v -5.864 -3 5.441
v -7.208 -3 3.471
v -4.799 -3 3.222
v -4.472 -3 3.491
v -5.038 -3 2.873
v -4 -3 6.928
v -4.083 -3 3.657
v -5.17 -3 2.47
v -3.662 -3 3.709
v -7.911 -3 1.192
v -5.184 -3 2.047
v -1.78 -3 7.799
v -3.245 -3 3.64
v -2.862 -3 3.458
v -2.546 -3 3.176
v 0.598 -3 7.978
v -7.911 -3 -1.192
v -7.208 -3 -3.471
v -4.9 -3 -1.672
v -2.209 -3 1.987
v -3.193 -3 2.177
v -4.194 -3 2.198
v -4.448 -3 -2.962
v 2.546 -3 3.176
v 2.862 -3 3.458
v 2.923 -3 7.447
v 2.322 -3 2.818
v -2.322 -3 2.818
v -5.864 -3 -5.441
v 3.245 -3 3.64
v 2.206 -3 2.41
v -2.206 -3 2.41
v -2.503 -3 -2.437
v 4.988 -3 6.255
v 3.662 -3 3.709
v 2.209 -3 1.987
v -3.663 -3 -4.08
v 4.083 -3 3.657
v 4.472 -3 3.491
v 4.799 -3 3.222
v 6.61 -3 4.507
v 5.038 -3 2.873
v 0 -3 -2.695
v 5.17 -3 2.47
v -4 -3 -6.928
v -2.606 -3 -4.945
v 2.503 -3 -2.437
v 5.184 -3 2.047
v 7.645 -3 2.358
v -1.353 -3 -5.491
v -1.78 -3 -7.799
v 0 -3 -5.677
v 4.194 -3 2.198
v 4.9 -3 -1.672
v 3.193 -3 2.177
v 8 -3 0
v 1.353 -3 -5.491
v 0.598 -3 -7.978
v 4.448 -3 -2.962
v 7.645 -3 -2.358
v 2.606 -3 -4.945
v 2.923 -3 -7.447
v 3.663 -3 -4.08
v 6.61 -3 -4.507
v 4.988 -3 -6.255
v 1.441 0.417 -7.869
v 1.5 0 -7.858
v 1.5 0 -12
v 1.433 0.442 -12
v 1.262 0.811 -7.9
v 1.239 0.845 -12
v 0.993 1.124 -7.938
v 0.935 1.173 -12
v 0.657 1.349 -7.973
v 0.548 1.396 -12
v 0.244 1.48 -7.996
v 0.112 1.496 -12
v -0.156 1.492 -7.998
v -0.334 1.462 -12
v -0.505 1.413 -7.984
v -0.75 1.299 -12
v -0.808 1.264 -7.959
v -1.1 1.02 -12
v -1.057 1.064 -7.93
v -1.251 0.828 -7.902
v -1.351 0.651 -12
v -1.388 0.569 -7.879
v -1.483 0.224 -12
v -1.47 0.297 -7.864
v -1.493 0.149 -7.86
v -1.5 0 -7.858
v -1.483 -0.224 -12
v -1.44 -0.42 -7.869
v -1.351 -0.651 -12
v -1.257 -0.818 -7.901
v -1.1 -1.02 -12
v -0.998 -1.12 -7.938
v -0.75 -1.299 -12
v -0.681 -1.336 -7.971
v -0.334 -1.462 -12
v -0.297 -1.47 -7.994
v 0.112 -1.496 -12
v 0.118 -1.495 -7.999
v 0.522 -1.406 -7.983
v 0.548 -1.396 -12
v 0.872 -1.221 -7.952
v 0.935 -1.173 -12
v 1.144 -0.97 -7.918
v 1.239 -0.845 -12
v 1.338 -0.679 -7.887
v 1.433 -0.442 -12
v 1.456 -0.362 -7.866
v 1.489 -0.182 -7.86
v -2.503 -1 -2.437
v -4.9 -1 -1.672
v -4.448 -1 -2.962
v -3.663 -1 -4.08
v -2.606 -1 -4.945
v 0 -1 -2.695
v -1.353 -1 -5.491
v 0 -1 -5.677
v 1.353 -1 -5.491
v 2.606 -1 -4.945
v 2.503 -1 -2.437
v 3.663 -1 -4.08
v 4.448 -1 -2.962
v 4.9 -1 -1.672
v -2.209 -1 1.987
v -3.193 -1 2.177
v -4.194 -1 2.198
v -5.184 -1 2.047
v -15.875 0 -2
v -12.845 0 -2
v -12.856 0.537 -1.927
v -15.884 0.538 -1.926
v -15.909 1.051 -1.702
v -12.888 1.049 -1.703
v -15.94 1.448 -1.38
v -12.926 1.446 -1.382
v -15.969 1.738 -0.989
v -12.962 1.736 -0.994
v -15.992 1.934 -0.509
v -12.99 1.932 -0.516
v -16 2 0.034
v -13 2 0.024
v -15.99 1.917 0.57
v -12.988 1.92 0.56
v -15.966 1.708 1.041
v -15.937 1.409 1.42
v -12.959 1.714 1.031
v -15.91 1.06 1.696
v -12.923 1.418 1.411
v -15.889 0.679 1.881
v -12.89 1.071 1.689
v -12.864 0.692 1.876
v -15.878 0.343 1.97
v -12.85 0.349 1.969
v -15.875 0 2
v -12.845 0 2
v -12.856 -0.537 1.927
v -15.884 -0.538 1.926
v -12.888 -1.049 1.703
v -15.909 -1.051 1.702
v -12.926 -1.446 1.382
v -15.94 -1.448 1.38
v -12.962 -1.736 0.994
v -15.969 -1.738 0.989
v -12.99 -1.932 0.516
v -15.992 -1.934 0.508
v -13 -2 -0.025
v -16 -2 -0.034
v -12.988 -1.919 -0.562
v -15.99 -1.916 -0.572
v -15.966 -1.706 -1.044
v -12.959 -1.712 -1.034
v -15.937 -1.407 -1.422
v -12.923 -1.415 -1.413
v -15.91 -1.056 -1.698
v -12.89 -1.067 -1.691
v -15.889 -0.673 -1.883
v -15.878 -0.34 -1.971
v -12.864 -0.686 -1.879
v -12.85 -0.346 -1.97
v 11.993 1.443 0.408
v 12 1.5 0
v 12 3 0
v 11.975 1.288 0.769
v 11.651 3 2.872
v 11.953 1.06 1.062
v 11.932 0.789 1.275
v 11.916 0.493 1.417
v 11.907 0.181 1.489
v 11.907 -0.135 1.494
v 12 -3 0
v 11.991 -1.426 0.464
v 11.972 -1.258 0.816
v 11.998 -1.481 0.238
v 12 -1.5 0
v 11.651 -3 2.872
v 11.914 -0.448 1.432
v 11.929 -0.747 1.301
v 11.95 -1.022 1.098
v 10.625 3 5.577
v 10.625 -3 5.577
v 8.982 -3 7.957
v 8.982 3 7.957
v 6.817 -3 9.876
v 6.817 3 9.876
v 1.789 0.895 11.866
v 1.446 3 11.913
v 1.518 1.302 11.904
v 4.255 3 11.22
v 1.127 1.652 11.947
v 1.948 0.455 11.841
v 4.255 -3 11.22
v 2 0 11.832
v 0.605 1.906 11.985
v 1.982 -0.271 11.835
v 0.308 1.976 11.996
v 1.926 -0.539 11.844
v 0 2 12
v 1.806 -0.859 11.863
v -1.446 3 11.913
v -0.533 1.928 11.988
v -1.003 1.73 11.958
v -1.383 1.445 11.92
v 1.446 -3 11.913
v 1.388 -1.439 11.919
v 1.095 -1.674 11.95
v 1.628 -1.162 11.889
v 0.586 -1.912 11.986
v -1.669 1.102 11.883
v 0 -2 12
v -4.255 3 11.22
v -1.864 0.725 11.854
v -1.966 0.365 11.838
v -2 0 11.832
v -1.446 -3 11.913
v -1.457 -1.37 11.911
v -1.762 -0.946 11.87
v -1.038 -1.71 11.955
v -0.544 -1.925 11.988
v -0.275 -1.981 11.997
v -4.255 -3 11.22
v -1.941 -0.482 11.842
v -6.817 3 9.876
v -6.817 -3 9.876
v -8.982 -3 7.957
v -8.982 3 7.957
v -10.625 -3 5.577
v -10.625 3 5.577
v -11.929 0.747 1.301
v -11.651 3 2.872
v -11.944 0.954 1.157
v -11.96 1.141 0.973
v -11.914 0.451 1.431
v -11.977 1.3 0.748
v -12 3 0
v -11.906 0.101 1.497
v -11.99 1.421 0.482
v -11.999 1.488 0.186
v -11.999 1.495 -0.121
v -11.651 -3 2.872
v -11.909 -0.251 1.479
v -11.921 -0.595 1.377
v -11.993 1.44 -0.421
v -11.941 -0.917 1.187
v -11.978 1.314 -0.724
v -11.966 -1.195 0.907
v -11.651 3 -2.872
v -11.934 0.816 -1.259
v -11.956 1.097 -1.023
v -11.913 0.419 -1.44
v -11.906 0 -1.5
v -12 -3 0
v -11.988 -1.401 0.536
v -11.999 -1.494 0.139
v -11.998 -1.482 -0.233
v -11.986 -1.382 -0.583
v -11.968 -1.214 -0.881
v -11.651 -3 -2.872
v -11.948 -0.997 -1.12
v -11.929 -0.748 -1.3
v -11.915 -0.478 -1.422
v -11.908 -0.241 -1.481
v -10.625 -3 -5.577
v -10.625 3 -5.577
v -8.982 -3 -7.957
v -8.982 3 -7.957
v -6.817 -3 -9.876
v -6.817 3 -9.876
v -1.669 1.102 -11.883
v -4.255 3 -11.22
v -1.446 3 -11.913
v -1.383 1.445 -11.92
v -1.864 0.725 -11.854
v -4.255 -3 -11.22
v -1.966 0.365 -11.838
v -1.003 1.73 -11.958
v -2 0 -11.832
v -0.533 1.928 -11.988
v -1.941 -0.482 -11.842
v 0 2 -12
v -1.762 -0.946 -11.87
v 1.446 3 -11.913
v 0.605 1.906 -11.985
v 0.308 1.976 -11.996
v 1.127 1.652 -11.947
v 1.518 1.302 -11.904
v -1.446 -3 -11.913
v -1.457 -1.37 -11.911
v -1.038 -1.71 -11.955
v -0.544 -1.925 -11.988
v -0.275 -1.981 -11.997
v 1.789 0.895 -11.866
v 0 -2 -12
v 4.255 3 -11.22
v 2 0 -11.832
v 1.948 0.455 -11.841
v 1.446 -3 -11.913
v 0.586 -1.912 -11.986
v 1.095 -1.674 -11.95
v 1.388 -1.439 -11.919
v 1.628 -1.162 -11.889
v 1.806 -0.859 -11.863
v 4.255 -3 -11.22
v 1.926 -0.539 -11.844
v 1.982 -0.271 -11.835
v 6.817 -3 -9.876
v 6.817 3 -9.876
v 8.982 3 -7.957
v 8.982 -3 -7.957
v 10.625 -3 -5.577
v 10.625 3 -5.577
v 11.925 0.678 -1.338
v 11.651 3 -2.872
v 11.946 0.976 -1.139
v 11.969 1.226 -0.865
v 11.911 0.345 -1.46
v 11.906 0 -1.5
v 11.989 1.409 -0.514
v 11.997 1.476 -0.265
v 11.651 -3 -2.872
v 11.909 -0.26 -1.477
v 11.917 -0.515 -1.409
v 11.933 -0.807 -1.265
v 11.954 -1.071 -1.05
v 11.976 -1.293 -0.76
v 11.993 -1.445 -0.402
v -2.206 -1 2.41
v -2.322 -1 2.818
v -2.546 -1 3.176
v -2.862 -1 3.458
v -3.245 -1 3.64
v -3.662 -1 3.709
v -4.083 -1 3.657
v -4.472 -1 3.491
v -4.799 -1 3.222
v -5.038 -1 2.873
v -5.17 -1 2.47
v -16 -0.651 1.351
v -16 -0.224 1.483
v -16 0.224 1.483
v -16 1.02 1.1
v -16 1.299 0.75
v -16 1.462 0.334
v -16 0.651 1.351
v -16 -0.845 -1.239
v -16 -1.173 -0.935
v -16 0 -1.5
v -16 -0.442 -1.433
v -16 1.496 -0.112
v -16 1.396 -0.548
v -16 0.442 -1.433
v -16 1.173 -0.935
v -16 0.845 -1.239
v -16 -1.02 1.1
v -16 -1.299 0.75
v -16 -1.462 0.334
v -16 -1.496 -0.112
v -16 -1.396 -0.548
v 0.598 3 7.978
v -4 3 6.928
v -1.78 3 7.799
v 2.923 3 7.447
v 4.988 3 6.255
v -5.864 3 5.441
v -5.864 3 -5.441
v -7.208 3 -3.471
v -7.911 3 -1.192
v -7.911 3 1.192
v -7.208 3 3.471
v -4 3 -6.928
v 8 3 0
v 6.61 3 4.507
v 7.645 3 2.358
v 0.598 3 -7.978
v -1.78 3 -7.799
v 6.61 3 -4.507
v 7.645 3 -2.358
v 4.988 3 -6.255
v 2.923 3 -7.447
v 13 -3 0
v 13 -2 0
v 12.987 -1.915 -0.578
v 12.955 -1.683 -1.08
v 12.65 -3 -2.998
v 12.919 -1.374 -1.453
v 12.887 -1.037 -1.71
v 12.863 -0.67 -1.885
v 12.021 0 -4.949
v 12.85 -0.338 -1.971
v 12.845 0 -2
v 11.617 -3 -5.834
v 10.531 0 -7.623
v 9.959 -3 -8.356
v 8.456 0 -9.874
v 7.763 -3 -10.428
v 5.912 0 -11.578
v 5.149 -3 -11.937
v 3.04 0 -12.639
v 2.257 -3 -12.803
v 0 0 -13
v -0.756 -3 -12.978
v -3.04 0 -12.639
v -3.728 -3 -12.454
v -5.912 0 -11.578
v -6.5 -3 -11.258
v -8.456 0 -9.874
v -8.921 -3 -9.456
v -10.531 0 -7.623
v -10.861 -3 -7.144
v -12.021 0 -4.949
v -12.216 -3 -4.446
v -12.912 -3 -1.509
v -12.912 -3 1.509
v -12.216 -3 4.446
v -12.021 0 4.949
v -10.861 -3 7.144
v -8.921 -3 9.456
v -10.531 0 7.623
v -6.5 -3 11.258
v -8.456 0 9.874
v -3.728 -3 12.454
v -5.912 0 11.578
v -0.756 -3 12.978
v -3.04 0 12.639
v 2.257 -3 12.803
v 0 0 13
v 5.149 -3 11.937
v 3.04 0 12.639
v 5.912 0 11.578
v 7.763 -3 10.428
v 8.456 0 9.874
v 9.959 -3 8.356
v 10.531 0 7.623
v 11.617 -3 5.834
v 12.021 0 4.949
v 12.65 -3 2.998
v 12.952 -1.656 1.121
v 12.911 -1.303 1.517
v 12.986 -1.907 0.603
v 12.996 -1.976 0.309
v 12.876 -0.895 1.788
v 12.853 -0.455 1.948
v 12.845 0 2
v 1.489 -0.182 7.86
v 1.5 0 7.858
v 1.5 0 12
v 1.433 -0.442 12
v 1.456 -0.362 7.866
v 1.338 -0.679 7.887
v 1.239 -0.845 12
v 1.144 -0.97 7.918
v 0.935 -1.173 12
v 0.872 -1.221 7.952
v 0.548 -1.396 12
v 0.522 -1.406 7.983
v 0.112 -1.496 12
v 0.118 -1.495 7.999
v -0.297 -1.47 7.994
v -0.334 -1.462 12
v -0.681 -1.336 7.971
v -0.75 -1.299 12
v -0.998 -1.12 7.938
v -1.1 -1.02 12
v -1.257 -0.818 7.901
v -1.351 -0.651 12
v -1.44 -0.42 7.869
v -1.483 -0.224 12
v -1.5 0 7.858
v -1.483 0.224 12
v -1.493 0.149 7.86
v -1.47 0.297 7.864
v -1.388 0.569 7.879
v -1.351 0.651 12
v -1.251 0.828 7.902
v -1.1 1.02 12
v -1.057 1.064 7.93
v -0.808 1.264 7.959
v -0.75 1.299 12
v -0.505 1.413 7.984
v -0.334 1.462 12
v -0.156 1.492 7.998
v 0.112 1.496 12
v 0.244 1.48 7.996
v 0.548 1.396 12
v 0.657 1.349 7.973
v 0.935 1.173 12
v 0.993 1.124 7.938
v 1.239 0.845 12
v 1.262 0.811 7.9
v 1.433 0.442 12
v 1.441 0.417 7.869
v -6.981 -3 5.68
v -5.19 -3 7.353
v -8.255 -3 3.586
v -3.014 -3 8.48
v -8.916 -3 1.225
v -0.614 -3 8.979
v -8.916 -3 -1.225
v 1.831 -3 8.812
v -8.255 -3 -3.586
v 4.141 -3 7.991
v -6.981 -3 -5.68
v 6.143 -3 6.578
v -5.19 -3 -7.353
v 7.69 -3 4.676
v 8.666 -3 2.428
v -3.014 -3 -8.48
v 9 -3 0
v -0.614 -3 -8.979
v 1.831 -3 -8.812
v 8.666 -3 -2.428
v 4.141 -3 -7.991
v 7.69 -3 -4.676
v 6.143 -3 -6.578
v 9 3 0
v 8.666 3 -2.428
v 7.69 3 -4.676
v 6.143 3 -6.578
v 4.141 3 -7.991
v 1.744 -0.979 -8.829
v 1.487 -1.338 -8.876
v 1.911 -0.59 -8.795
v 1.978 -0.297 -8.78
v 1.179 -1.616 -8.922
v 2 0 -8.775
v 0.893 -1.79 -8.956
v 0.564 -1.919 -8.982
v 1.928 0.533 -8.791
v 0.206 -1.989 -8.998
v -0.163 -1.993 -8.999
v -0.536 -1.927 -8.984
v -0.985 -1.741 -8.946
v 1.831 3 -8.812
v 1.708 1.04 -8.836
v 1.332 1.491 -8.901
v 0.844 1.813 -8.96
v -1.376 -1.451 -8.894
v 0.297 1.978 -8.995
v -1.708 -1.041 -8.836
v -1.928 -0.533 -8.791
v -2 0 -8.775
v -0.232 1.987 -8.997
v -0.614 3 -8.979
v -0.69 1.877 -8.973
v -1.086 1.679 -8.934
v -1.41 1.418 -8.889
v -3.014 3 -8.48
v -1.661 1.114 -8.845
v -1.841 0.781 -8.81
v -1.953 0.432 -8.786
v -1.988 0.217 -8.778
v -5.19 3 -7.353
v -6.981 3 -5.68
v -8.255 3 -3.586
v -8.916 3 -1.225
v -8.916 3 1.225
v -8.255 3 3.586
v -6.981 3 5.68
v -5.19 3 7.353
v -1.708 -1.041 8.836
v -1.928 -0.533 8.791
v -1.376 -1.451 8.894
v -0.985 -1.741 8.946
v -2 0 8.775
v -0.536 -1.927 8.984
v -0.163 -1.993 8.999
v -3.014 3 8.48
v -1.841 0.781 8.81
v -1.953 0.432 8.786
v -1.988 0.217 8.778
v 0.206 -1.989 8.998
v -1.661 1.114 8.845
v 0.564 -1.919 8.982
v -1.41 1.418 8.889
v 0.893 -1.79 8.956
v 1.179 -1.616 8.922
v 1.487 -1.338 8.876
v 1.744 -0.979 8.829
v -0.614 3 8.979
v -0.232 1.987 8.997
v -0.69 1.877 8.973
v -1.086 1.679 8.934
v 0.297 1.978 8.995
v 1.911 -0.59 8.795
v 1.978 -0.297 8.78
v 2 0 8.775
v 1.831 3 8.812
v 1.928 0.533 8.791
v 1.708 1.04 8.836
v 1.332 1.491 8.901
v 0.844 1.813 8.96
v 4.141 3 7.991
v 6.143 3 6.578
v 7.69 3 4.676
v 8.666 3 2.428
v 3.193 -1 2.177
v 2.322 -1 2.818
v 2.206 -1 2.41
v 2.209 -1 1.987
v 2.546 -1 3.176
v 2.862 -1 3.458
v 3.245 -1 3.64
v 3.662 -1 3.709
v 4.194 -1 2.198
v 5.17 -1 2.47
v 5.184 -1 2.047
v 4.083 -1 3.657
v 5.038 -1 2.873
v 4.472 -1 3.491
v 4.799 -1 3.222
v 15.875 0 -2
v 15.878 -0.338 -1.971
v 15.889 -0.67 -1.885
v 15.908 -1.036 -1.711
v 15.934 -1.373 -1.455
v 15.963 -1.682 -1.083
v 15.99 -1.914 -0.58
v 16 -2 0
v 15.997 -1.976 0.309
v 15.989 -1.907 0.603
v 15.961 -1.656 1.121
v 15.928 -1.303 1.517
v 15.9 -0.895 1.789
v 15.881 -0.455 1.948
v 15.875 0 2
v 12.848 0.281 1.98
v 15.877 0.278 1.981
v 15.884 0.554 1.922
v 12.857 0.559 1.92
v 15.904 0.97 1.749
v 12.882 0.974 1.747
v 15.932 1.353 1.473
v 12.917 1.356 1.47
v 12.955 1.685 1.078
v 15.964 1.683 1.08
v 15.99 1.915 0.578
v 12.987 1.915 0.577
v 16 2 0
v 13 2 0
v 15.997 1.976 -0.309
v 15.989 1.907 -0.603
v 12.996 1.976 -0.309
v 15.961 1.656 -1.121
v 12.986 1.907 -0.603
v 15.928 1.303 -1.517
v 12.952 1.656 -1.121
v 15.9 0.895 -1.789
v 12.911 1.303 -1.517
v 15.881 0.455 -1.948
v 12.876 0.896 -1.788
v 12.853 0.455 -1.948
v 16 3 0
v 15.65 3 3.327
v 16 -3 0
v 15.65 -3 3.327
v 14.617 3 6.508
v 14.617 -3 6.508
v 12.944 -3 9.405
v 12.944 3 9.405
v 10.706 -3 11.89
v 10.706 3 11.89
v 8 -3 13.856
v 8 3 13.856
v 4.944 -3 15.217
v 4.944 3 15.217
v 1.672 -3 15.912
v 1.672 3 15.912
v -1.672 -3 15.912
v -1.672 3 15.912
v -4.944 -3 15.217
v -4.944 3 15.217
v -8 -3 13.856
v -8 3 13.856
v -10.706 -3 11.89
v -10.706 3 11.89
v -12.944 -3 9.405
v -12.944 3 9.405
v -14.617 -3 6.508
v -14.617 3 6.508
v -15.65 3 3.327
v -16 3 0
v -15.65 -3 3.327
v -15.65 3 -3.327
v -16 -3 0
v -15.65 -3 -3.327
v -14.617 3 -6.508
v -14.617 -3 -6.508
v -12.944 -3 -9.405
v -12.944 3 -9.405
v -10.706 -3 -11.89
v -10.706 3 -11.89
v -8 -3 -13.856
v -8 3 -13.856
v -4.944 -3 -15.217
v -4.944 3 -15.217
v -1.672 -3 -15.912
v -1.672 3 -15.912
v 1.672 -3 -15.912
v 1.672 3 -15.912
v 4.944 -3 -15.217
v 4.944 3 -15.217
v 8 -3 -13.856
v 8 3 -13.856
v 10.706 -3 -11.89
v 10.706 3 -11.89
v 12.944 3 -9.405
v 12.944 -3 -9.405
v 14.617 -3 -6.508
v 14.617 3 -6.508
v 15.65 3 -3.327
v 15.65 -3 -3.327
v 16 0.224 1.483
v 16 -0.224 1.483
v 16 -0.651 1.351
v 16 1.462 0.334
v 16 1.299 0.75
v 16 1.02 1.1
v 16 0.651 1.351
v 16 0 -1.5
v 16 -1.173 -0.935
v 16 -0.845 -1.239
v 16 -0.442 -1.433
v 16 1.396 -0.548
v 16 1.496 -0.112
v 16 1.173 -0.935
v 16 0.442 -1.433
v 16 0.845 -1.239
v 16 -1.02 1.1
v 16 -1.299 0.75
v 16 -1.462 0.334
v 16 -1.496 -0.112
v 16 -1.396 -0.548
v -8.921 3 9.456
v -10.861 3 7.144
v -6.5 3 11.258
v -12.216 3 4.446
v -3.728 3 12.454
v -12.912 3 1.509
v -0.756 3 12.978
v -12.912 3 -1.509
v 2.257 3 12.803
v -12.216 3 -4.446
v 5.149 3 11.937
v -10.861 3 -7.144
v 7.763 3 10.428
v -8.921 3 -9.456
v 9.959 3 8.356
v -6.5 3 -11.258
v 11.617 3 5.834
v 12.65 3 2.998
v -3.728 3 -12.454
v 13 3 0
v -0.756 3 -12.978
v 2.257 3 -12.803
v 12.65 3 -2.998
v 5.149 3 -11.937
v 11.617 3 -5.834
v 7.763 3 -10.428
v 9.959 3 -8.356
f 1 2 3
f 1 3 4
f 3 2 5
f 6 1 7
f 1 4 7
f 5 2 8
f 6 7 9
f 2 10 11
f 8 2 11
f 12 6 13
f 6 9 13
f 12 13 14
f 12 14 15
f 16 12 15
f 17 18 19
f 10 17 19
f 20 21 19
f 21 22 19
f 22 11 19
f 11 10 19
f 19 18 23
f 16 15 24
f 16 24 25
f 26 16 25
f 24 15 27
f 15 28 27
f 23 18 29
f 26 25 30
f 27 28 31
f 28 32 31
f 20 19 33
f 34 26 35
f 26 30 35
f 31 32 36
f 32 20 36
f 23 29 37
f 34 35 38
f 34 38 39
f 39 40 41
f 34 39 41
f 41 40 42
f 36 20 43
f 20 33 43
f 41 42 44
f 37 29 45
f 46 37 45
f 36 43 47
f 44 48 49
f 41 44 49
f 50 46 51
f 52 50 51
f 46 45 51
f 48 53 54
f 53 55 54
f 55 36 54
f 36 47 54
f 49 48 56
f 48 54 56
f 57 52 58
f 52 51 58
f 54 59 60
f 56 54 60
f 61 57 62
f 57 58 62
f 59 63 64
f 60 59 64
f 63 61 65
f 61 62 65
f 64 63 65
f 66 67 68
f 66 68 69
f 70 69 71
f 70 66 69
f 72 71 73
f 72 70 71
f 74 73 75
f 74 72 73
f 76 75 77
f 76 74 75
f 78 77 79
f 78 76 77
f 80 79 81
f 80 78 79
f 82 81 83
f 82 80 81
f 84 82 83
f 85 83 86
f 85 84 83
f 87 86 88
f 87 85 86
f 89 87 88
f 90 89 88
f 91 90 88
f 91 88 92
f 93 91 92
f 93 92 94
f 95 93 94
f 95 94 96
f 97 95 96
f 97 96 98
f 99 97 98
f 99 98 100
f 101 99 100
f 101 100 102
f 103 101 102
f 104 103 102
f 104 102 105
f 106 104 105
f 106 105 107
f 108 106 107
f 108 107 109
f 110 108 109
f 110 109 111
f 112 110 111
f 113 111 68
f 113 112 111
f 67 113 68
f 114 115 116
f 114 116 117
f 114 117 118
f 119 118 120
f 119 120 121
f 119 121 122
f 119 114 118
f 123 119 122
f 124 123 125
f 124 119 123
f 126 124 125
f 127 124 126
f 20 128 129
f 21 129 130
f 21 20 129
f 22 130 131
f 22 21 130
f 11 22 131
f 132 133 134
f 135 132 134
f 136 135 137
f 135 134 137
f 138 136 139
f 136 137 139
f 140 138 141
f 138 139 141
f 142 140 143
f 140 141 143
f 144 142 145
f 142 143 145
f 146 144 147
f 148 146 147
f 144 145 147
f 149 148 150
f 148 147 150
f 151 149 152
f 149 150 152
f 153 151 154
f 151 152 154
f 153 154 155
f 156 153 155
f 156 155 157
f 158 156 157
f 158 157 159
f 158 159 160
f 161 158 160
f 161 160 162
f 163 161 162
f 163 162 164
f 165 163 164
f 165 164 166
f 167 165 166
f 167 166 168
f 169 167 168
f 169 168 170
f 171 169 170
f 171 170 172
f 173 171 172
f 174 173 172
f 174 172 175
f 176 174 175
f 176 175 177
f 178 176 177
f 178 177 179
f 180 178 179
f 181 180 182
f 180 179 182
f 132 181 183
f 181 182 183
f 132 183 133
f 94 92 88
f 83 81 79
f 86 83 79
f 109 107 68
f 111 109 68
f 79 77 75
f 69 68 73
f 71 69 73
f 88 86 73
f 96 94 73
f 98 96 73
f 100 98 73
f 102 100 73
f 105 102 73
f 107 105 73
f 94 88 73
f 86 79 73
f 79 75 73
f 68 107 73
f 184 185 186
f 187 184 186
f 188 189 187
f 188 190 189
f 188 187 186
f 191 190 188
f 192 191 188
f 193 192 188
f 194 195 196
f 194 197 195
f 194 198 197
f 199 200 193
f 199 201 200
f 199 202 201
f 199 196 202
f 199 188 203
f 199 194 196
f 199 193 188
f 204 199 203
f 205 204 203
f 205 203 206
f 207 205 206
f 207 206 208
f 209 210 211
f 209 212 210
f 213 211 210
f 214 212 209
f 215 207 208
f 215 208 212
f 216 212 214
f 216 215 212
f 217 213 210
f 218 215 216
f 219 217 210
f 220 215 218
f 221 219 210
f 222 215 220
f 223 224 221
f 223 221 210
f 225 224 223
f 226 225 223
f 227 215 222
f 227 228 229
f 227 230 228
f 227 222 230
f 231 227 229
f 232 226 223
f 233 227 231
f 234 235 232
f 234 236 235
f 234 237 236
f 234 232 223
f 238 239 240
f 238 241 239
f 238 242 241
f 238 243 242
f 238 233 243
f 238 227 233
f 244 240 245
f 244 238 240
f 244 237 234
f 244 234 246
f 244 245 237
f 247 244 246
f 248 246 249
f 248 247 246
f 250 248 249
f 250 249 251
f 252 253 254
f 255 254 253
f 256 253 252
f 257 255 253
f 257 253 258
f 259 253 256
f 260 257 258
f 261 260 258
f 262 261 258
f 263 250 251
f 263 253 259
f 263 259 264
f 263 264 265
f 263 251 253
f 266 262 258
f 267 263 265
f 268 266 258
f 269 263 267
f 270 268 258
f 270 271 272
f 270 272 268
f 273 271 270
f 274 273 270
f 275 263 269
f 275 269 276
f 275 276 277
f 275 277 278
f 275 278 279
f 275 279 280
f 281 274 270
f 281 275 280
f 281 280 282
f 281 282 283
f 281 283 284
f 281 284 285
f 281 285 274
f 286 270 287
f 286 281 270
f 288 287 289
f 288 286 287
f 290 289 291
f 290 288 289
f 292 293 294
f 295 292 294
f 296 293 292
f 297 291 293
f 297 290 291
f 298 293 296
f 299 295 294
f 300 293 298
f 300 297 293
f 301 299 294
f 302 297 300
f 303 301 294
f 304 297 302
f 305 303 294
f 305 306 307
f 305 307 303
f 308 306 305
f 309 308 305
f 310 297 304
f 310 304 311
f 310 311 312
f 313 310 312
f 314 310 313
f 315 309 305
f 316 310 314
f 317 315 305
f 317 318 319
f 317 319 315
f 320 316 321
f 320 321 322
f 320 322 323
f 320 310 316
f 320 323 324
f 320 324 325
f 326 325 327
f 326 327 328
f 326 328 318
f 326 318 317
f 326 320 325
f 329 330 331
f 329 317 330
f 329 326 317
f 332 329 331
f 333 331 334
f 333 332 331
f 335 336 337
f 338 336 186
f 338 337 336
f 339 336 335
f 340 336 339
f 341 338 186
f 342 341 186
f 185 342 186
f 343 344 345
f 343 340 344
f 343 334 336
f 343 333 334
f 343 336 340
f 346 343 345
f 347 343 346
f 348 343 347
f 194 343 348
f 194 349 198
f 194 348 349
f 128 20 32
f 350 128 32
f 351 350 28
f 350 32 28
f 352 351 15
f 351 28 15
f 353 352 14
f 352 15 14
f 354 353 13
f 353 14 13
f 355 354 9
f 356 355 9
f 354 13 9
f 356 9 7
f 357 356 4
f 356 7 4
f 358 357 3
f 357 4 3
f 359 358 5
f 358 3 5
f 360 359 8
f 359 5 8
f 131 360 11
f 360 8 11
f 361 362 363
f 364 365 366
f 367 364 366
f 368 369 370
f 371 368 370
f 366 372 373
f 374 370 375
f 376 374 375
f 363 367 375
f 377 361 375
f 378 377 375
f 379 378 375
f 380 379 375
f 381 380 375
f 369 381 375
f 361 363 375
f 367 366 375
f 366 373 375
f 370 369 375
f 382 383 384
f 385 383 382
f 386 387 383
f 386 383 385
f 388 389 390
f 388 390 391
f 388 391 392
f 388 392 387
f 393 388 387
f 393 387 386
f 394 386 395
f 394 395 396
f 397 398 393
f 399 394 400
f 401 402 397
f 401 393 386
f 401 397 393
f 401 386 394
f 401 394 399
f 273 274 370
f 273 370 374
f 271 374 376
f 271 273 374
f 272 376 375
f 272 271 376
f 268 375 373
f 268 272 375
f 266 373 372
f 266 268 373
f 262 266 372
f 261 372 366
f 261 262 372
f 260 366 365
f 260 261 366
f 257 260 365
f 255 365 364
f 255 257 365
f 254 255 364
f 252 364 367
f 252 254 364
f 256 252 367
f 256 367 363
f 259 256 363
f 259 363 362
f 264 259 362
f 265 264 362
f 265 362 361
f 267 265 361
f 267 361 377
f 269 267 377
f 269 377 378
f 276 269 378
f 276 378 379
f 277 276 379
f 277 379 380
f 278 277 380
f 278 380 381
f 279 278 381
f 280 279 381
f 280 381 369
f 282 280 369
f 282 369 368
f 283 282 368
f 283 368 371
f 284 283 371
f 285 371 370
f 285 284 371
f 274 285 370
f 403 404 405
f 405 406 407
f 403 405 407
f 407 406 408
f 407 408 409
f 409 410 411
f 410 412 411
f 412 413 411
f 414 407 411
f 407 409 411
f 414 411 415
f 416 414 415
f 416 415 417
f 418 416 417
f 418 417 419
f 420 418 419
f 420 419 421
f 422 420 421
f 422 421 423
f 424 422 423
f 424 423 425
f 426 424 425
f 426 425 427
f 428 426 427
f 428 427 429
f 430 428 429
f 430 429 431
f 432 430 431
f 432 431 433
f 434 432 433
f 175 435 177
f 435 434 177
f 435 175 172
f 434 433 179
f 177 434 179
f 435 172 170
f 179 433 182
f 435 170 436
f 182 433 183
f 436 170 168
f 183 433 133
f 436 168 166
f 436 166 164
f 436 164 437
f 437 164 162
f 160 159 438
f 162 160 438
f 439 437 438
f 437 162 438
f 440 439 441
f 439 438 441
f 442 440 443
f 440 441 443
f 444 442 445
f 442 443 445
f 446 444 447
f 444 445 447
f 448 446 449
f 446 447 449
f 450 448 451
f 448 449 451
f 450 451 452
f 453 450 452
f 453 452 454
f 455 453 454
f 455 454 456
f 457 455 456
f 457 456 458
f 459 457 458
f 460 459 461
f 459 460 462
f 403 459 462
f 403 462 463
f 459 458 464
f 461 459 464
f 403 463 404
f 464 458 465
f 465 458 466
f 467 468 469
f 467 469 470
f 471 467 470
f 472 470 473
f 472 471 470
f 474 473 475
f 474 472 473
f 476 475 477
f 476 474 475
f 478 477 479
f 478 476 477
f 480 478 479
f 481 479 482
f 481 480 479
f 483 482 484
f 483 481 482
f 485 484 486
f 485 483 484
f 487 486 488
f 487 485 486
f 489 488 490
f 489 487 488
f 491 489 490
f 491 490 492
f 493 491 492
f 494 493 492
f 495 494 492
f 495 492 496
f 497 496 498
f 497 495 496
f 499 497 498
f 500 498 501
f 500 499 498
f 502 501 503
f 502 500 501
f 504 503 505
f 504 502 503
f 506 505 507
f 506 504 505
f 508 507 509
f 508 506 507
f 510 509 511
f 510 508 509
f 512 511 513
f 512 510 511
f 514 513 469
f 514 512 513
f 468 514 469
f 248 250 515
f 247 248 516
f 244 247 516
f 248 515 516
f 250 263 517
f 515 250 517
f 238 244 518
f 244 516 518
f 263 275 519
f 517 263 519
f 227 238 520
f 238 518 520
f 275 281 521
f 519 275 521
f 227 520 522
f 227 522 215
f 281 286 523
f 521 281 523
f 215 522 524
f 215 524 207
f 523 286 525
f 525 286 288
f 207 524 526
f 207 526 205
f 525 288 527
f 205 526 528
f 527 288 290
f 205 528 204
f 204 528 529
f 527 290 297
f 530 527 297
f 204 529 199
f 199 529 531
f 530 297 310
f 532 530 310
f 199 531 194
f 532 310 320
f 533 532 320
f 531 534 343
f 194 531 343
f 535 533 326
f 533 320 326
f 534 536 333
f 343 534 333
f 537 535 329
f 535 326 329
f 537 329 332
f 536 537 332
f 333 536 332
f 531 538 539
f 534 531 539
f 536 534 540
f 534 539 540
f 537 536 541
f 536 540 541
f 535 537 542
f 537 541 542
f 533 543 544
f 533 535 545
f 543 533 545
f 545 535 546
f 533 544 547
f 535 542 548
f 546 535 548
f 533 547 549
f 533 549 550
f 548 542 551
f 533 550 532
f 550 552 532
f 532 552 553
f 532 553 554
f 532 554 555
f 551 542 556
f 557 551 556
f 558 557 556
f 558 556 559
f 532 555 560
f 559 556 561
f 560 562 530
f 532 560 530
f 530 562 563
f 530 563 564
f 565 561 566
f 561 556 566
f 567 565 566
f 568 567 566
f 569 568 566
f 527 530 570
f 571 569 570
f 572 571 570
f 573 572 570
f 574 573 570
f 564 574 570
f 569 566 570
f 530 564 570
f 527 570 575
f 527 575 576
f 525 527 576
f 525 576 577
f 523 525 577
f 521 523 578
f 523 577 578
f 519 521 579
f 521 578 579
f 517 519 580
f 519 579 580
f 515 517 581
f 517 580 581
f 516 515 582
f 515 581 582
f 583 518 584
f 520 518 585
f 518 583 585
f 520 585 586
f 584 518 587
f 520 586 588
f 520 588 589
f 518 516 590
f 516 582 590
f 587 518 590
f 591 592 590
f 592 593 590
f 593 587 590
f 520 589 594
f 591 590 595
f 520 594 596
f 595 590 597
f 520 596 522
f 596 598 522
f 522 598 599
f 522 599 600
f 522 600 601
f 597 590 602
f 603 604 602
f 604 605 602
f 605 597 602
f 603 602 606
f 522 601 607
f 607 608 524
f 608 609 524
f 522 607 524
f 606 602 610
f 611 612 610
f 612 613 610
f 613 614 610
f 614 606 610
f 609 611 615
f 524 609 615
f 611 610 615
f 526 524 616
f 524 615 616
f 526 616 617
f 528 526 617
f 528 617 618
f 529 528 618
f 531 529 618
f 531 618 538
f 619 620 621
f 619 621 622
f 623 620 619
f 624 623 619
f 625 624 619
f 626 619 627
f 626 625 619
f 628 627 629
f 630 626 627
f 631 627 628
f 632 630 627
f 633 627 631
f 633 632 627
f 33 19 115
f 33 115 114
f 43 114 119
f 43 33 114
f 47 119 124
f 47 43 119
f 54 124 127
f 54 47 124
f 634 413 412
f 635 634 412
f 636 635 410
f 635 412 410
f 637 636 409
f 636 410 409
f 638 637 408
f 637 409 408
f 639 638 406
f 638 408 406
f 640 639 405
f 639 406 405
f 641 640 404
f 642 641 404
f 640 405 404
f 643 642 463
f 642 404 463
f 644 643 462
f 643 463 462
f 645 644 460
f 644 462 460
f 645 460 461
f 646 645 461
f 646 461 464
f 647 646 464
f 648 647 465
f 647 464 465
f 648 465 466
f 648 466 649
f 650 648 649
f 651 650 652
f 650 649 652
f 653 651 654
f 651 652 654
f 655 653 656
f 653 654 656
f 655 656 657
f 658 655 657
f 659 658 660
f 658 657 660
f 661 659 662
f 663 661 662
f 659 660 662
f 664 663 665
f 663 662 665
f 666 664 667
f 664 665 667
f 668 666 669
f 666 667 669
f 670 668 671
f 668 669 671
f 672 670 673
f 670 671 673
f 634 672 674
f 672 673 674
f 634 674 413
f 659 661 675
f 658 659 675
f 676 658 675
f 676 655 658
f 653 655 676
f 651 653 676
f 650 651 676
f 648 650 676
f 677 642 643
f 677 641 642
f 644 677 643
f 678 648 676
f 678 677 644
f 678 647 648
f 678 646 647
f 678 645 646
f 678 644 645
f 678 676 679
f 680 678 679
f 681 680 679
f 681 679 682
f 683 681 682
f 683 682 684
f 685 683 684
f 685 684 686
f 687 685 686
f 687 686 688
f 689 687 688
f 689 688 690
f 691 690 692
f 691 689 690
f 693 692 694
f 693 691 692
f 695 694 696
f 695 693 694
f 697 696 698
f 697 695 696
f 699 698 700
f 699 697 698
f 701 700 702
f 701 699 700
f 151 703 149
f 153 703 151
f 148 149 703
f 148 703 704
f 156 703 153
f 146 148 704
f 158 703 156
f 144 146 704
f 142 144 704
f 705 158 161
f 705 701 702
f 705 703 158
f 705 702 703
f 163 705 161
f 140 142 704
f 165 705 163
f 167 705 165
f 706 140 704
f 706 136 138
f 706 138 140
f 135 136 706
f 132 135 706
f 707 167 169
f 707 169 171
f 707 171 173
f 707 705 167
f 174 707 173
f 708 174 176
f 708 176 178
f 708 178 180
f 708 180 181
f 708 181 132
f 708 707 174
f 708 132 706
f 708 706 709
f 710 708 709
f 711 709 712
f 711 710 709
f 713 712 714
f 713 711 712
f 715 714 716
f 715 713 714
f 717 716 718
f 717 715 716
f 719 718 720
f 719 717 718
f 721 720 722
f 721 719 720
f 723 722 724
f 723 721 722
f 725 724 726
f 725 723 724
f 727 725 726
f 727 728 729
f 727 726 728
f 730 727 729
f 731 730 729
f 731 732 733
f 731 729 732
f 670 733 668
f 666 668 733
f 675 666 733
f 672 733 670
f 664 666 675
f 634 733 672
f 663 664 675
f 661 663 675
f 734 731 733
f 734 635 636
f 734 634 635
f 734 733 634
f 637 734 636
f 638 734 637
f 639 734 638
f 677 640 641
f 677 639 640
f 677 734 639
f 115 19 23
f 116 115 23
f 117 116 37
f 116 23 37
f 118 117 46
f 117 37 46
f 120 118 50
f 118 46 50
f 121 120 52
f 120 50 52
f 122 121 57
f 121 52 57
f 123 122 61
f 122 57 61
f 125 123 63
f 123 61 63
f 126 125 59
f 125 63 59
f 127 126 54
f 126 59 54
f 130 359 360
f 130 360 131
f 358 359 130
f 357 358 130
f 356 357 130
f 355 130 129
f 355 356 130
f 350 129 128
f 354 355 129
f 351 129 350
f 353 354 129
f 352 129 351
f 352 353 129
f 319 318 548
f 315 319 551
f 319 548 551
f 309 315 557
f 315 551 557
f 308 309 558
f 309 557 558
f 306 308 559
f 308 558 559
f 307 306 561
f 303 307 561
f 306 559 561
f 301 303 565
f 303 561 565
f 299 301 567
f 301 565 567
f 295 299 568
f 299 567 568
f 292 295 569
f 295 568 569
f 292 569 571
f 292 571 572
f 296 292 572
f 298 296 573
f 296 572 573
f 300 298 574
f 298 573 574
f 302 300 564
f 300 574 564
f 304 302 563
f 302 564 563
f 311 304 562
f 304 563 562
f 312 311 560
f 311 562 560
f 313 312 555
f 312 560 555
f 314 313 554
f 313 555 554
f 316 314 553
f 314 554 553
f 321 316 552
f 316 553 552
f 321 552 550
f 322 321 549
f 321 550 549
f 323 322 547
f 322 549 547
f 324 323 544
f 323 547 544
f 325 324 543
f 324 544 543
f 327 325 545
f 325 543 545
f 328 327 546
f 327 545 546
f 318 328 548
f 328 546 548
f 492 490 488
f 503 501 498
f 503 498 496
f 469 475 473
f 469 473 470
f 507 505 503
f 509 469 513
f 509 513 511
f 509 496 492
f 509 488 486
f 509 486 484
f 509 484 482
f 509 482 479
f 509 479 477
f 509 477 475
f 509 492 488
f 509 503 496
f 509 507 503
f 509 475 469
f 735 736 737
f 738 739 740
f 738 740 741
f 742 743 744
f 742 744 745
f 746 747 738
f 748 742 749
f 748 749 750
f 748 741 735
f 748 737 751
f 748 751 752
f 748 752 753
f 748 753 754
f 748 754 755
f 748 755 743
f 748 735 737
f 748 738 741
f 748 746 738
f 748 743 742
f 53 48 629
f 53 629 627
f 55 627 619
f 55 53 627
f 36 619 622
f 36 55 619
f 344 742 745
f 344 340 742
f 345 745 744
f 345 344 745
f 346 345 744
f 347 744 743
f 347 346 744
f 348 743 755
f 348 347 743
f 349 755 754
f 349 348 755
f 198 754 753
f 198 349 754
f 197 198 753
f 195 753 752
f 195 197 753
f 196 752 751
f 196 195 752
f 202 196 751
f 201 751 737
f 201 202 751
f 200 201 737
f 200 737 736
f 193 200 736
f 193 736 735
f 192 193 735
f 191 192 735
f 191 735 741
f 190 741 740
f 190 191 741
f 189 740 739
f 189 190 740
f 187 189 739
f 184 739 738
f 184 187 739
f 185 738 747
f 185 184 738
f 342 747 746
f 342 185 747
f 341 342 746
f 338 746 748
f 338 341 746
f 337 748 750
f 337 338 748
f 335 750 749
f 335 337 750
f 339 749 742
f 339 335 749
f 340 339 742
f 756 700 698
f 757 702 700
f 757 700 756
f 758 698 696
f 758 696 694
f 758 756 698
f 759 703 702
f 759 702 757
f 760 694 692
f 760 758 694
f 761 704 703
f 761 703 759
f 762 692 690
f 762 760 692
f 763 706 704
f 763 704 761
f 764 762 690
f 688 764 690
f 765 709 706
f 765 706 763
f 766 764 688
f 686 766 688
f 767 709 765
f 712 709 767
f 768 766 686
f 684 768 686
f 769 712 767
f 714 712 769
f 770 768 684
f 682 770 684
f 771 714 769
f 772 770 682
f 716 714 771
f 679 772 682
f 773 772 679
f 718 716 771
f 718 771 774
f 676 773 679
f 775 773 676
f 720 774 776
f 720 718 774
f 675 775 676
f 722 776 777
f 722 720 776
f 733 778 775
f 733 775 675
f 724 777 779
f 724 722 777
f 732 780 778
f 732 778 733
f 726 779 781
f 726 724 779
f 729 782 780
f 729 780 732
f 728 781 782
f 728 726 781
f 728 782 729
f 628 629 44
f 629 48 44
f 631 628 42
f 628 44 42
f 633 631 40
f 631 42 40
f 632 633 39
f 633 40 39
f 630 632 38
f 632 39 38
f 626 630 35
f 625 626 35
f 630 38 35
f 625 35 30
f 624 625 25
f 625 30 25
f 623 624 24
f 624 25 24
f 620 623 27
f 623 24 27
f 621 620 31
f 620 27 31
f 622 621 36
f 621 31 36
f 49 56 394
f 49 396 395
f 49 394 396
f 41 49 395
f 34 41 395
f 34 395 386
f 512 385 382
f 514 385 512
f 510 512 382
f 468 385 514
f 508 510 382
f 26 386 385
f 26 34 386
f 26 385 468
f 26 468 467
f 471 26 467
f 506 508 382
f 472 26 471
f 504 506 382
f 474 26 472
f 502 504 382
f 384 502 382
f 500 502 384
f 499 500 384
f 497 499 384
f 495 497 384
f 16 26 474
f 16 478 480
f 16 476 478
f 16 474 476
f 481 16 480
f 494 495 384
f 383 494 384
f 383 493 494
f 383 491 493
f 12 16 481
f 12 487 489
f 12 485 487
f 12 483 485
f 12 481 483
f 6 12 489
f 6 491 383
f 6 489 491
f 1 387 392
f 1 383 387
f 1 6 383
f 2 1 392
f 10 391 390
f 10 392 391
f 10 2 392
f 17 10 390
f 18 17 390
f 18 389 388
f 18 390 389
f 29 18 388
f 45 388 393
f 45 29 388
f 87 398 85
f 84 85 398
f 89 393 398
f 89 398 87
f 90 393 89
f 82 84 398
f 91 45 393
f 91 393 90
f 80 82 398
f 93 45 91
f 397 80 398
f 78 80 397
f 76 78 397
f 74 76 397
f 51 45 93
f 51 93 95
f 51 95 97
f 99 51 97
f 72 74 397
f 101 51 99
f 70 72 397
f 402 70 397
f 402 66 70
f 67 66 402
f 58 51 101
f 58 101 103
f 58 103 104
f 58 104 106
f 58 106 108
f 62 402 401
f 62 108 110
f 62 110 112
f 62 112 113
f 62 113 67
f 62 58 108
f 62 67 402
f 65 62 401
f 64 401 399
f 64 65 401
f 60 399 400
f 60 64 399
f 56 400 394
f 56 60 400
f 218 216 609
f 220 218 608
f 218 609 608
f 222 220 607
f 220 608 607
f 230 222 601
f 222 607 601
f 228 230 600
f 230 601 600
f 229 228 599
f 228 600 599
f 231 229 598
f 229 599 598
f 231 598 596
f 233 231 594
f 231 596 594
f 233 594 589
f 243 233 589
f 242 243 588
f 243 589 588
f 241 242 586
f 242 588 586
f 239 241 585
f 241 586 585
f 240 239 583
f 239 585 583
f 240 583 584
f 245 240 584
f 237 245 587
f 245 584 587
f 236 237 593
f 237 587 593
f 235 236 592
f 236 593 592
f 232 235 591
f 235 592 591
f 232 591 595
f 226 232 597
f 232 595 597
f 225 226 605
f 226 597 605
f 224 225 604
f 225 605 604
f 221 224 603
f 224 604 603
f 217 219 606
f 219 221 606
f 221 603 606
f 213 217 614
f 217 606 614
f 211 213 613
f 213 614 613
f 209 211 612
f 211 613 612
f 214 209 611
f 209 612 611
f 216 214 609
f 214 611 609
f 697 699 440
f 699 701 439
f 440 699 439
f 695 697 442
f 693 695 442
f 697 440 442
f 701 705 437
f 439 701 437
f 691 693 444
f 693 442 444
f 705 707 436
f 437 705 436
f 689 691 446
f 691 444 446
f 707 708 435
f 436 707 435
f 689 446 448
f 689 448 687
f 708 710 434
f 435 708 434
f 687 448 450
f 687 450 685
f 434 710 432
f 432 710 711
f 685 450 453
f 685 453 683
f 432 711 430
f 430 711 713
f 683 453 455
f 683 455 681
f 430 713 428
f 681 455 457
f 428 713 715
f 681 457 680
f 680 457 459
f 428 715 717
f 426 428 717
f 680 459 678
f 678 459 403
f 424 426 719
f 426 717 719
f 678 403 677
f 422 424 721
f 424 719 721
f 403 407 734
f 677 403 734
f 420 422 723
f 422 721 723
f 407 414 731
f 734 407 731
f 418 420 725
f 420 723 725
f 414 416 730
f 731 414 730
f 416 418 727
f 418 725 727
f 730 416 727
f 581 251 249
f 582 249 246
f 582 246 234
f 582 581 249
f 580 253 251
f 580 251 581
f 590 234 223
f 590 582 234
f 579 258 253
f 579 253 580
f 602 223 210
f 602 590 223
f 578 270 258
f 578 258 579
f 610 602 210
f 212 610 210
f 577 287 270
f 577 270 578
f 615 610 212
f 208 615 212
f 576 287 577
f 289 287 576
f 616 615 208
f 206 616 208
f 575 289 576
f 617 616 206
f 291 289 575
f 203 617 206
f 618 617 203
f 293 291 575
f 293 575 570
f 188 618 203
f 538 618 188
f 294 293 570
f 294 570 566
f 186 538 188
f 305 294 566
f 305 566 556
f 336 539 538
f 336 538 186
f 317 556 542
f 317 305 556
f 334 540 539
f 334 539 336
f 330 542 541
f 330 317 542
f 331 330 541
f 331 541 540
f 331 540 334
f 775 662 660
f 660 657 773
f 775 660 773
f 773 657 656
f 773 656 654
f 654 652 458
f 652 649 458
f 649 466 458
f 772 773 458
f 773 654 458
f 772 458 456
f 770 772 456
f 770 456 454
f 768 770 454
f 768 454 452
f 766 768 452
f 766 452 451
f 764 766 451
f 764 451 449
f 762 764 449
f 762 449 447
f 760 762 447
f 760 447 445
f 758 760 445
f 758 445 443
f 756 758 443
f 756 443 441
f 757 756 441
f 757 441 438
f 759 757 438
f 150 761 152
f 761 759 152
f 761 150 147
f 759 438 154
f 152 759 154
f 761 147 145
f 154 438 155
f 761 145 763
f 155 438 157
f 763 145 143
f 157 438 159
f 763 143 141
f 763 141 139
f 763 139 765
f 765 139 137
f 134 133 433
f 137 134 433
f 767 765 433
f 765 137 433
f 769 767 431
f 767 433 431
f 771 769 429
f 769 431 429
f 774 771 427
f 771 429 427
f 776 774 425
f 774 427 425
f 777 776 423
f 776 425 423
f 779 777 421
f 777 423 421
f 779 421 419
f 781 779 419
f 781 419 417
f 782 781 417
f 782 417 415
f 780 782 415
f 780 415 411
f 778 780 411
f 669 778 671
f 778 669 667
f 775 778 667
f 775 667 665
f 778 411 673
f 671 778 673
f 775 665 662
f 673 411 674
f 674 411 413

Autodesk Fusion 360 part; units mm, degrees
sketch "Sketch1" plane through (0, 0, 0) normal (0, 1, 0) x (1, 0, 0)
  circle A0 centre (0, 0) radius 8
  circle A1 centre (0, 0) radius 9
  circle A2 centre (0, 0) radius 12
  circle A3 centre (0, 0) radius 13
  circle A4 centre (0, 0) radius 16
  dimension "d4" = 16
  dimension "d5" = 1
  dimension "d6" = 3
  dimension "d7" = 1
  dimension "d8" = 3
extrude "Extrude1" add sketch "Sketch1" along normal mid plane 6 makes body 1 at (1.6626, 3, 1.29) makes body 2 at (11.9851, 2, 0.5982) makes body 3 at (15.9801, 2, 0.7975)
sketch "Sketch2" plane through (0, 0, 0) normal (0, 0, 1) x (1, 0, 0)
  circle A0 centre (0, 0) radius 1.5
  circle A1 centre (0, 0) radius 2
  dimension "d13" = 3
  dimension "d14" = 0.5
extrude "Extrude2" add sketch "Sketch2" along normal mid plane 24 contours A0 bodies 1
extrude "Extrude3" cut sketch "Sketch2" along normal mid plane 24 contours A0 | A1 bodies 2
sketch "Sketch3" plane through (0, 0, 0) normal (1, 0, 0) x (0, 0, -1)
  circle A0 centre (0, 0) radius 1.5
  circle A1 centre (0, 0) radius 2
  dimension "d19" = 3
  dimension "d20" = 0.5
extrude "Extrude4" add sketch "Sketch3" along normal blind 7 from surface at 9 contours A0 bodies 2
extrude "Extrude5" add sketch "Sketch3" against normal blind 7 from surface at -9 contours A0 bodies 2
extrude "Extrude6" cut sketch "Sketch3" along normal through all and the other way through all contours A0 | A1 bodies 3
sketch "Sketch4" plane through (0, -3, 0) normal (0, -1, 0) x (1, 0, 0)
  circle A0 centre (0, 0) radius 8
  arc A1 (-2.2094, 1.9868) -> (-5.1841, 2.0472) centre (-3.6929, 2.209) ccw
  line L0 (0, 0) -> (0, 8) construction
  arc A2 (5.1841, 2.0472) -> (2.2094, 1.9868) centre (3.6929, 2.209) ccw
  arc A3 (-4.9, -1.6724) -> (4.9, -1.6724) centre (0, -0.6772) ccw
  arc A4 (-4.9, -1.6724) -> (4.9, -1.6724) centre (0, 9.5513) ccw
  arc A5 (-2.2094, 1.9868) -> (-5.1841, 2.0472) centre (-3.8119, -3.6487) ccw
  arc A6 (5.1841, 2.0472) -> (2.2094, 1.9868) centre (3.8119, -3.6487) ccw
  dimension "d28" = 1.5
  dimension "d29" = 5
extrude "Extrude7" cut sketch "Sketch4" against normal blind 2 contours A1 A5 | A2 A6 | A3 A4 bodies 1
equation "center = 16 mm"
equation "ringspace = 1 mm"
equation "ringwidth = 3 mm"
equation "d4 = center"
equation "d5 = ringspace"
equation "d6 = ringwidth"
equation "d7 = ringspace"
equation "d8 = ringwidth"
equation "rod = 3 mm"
equation "rodspace = 0.5 mm"
equation "d13 = rod"
equation "d14 = rodspace"
equation "d15 = center / 2 + ringspace + ringwidth"
equation "d17 = center / 2 + ringspace + ringwidth"
equation "d19 = rod"
equation "d20 = rodspace"
equation "d21 = center / 2 + ringspace"
equation "d22 = ringwidth + ringspace + ringwidth"
equation "d24 = -center / 2 - ringspace"
equation "d25 = -ringwidth - ringspace - ringwidth"
